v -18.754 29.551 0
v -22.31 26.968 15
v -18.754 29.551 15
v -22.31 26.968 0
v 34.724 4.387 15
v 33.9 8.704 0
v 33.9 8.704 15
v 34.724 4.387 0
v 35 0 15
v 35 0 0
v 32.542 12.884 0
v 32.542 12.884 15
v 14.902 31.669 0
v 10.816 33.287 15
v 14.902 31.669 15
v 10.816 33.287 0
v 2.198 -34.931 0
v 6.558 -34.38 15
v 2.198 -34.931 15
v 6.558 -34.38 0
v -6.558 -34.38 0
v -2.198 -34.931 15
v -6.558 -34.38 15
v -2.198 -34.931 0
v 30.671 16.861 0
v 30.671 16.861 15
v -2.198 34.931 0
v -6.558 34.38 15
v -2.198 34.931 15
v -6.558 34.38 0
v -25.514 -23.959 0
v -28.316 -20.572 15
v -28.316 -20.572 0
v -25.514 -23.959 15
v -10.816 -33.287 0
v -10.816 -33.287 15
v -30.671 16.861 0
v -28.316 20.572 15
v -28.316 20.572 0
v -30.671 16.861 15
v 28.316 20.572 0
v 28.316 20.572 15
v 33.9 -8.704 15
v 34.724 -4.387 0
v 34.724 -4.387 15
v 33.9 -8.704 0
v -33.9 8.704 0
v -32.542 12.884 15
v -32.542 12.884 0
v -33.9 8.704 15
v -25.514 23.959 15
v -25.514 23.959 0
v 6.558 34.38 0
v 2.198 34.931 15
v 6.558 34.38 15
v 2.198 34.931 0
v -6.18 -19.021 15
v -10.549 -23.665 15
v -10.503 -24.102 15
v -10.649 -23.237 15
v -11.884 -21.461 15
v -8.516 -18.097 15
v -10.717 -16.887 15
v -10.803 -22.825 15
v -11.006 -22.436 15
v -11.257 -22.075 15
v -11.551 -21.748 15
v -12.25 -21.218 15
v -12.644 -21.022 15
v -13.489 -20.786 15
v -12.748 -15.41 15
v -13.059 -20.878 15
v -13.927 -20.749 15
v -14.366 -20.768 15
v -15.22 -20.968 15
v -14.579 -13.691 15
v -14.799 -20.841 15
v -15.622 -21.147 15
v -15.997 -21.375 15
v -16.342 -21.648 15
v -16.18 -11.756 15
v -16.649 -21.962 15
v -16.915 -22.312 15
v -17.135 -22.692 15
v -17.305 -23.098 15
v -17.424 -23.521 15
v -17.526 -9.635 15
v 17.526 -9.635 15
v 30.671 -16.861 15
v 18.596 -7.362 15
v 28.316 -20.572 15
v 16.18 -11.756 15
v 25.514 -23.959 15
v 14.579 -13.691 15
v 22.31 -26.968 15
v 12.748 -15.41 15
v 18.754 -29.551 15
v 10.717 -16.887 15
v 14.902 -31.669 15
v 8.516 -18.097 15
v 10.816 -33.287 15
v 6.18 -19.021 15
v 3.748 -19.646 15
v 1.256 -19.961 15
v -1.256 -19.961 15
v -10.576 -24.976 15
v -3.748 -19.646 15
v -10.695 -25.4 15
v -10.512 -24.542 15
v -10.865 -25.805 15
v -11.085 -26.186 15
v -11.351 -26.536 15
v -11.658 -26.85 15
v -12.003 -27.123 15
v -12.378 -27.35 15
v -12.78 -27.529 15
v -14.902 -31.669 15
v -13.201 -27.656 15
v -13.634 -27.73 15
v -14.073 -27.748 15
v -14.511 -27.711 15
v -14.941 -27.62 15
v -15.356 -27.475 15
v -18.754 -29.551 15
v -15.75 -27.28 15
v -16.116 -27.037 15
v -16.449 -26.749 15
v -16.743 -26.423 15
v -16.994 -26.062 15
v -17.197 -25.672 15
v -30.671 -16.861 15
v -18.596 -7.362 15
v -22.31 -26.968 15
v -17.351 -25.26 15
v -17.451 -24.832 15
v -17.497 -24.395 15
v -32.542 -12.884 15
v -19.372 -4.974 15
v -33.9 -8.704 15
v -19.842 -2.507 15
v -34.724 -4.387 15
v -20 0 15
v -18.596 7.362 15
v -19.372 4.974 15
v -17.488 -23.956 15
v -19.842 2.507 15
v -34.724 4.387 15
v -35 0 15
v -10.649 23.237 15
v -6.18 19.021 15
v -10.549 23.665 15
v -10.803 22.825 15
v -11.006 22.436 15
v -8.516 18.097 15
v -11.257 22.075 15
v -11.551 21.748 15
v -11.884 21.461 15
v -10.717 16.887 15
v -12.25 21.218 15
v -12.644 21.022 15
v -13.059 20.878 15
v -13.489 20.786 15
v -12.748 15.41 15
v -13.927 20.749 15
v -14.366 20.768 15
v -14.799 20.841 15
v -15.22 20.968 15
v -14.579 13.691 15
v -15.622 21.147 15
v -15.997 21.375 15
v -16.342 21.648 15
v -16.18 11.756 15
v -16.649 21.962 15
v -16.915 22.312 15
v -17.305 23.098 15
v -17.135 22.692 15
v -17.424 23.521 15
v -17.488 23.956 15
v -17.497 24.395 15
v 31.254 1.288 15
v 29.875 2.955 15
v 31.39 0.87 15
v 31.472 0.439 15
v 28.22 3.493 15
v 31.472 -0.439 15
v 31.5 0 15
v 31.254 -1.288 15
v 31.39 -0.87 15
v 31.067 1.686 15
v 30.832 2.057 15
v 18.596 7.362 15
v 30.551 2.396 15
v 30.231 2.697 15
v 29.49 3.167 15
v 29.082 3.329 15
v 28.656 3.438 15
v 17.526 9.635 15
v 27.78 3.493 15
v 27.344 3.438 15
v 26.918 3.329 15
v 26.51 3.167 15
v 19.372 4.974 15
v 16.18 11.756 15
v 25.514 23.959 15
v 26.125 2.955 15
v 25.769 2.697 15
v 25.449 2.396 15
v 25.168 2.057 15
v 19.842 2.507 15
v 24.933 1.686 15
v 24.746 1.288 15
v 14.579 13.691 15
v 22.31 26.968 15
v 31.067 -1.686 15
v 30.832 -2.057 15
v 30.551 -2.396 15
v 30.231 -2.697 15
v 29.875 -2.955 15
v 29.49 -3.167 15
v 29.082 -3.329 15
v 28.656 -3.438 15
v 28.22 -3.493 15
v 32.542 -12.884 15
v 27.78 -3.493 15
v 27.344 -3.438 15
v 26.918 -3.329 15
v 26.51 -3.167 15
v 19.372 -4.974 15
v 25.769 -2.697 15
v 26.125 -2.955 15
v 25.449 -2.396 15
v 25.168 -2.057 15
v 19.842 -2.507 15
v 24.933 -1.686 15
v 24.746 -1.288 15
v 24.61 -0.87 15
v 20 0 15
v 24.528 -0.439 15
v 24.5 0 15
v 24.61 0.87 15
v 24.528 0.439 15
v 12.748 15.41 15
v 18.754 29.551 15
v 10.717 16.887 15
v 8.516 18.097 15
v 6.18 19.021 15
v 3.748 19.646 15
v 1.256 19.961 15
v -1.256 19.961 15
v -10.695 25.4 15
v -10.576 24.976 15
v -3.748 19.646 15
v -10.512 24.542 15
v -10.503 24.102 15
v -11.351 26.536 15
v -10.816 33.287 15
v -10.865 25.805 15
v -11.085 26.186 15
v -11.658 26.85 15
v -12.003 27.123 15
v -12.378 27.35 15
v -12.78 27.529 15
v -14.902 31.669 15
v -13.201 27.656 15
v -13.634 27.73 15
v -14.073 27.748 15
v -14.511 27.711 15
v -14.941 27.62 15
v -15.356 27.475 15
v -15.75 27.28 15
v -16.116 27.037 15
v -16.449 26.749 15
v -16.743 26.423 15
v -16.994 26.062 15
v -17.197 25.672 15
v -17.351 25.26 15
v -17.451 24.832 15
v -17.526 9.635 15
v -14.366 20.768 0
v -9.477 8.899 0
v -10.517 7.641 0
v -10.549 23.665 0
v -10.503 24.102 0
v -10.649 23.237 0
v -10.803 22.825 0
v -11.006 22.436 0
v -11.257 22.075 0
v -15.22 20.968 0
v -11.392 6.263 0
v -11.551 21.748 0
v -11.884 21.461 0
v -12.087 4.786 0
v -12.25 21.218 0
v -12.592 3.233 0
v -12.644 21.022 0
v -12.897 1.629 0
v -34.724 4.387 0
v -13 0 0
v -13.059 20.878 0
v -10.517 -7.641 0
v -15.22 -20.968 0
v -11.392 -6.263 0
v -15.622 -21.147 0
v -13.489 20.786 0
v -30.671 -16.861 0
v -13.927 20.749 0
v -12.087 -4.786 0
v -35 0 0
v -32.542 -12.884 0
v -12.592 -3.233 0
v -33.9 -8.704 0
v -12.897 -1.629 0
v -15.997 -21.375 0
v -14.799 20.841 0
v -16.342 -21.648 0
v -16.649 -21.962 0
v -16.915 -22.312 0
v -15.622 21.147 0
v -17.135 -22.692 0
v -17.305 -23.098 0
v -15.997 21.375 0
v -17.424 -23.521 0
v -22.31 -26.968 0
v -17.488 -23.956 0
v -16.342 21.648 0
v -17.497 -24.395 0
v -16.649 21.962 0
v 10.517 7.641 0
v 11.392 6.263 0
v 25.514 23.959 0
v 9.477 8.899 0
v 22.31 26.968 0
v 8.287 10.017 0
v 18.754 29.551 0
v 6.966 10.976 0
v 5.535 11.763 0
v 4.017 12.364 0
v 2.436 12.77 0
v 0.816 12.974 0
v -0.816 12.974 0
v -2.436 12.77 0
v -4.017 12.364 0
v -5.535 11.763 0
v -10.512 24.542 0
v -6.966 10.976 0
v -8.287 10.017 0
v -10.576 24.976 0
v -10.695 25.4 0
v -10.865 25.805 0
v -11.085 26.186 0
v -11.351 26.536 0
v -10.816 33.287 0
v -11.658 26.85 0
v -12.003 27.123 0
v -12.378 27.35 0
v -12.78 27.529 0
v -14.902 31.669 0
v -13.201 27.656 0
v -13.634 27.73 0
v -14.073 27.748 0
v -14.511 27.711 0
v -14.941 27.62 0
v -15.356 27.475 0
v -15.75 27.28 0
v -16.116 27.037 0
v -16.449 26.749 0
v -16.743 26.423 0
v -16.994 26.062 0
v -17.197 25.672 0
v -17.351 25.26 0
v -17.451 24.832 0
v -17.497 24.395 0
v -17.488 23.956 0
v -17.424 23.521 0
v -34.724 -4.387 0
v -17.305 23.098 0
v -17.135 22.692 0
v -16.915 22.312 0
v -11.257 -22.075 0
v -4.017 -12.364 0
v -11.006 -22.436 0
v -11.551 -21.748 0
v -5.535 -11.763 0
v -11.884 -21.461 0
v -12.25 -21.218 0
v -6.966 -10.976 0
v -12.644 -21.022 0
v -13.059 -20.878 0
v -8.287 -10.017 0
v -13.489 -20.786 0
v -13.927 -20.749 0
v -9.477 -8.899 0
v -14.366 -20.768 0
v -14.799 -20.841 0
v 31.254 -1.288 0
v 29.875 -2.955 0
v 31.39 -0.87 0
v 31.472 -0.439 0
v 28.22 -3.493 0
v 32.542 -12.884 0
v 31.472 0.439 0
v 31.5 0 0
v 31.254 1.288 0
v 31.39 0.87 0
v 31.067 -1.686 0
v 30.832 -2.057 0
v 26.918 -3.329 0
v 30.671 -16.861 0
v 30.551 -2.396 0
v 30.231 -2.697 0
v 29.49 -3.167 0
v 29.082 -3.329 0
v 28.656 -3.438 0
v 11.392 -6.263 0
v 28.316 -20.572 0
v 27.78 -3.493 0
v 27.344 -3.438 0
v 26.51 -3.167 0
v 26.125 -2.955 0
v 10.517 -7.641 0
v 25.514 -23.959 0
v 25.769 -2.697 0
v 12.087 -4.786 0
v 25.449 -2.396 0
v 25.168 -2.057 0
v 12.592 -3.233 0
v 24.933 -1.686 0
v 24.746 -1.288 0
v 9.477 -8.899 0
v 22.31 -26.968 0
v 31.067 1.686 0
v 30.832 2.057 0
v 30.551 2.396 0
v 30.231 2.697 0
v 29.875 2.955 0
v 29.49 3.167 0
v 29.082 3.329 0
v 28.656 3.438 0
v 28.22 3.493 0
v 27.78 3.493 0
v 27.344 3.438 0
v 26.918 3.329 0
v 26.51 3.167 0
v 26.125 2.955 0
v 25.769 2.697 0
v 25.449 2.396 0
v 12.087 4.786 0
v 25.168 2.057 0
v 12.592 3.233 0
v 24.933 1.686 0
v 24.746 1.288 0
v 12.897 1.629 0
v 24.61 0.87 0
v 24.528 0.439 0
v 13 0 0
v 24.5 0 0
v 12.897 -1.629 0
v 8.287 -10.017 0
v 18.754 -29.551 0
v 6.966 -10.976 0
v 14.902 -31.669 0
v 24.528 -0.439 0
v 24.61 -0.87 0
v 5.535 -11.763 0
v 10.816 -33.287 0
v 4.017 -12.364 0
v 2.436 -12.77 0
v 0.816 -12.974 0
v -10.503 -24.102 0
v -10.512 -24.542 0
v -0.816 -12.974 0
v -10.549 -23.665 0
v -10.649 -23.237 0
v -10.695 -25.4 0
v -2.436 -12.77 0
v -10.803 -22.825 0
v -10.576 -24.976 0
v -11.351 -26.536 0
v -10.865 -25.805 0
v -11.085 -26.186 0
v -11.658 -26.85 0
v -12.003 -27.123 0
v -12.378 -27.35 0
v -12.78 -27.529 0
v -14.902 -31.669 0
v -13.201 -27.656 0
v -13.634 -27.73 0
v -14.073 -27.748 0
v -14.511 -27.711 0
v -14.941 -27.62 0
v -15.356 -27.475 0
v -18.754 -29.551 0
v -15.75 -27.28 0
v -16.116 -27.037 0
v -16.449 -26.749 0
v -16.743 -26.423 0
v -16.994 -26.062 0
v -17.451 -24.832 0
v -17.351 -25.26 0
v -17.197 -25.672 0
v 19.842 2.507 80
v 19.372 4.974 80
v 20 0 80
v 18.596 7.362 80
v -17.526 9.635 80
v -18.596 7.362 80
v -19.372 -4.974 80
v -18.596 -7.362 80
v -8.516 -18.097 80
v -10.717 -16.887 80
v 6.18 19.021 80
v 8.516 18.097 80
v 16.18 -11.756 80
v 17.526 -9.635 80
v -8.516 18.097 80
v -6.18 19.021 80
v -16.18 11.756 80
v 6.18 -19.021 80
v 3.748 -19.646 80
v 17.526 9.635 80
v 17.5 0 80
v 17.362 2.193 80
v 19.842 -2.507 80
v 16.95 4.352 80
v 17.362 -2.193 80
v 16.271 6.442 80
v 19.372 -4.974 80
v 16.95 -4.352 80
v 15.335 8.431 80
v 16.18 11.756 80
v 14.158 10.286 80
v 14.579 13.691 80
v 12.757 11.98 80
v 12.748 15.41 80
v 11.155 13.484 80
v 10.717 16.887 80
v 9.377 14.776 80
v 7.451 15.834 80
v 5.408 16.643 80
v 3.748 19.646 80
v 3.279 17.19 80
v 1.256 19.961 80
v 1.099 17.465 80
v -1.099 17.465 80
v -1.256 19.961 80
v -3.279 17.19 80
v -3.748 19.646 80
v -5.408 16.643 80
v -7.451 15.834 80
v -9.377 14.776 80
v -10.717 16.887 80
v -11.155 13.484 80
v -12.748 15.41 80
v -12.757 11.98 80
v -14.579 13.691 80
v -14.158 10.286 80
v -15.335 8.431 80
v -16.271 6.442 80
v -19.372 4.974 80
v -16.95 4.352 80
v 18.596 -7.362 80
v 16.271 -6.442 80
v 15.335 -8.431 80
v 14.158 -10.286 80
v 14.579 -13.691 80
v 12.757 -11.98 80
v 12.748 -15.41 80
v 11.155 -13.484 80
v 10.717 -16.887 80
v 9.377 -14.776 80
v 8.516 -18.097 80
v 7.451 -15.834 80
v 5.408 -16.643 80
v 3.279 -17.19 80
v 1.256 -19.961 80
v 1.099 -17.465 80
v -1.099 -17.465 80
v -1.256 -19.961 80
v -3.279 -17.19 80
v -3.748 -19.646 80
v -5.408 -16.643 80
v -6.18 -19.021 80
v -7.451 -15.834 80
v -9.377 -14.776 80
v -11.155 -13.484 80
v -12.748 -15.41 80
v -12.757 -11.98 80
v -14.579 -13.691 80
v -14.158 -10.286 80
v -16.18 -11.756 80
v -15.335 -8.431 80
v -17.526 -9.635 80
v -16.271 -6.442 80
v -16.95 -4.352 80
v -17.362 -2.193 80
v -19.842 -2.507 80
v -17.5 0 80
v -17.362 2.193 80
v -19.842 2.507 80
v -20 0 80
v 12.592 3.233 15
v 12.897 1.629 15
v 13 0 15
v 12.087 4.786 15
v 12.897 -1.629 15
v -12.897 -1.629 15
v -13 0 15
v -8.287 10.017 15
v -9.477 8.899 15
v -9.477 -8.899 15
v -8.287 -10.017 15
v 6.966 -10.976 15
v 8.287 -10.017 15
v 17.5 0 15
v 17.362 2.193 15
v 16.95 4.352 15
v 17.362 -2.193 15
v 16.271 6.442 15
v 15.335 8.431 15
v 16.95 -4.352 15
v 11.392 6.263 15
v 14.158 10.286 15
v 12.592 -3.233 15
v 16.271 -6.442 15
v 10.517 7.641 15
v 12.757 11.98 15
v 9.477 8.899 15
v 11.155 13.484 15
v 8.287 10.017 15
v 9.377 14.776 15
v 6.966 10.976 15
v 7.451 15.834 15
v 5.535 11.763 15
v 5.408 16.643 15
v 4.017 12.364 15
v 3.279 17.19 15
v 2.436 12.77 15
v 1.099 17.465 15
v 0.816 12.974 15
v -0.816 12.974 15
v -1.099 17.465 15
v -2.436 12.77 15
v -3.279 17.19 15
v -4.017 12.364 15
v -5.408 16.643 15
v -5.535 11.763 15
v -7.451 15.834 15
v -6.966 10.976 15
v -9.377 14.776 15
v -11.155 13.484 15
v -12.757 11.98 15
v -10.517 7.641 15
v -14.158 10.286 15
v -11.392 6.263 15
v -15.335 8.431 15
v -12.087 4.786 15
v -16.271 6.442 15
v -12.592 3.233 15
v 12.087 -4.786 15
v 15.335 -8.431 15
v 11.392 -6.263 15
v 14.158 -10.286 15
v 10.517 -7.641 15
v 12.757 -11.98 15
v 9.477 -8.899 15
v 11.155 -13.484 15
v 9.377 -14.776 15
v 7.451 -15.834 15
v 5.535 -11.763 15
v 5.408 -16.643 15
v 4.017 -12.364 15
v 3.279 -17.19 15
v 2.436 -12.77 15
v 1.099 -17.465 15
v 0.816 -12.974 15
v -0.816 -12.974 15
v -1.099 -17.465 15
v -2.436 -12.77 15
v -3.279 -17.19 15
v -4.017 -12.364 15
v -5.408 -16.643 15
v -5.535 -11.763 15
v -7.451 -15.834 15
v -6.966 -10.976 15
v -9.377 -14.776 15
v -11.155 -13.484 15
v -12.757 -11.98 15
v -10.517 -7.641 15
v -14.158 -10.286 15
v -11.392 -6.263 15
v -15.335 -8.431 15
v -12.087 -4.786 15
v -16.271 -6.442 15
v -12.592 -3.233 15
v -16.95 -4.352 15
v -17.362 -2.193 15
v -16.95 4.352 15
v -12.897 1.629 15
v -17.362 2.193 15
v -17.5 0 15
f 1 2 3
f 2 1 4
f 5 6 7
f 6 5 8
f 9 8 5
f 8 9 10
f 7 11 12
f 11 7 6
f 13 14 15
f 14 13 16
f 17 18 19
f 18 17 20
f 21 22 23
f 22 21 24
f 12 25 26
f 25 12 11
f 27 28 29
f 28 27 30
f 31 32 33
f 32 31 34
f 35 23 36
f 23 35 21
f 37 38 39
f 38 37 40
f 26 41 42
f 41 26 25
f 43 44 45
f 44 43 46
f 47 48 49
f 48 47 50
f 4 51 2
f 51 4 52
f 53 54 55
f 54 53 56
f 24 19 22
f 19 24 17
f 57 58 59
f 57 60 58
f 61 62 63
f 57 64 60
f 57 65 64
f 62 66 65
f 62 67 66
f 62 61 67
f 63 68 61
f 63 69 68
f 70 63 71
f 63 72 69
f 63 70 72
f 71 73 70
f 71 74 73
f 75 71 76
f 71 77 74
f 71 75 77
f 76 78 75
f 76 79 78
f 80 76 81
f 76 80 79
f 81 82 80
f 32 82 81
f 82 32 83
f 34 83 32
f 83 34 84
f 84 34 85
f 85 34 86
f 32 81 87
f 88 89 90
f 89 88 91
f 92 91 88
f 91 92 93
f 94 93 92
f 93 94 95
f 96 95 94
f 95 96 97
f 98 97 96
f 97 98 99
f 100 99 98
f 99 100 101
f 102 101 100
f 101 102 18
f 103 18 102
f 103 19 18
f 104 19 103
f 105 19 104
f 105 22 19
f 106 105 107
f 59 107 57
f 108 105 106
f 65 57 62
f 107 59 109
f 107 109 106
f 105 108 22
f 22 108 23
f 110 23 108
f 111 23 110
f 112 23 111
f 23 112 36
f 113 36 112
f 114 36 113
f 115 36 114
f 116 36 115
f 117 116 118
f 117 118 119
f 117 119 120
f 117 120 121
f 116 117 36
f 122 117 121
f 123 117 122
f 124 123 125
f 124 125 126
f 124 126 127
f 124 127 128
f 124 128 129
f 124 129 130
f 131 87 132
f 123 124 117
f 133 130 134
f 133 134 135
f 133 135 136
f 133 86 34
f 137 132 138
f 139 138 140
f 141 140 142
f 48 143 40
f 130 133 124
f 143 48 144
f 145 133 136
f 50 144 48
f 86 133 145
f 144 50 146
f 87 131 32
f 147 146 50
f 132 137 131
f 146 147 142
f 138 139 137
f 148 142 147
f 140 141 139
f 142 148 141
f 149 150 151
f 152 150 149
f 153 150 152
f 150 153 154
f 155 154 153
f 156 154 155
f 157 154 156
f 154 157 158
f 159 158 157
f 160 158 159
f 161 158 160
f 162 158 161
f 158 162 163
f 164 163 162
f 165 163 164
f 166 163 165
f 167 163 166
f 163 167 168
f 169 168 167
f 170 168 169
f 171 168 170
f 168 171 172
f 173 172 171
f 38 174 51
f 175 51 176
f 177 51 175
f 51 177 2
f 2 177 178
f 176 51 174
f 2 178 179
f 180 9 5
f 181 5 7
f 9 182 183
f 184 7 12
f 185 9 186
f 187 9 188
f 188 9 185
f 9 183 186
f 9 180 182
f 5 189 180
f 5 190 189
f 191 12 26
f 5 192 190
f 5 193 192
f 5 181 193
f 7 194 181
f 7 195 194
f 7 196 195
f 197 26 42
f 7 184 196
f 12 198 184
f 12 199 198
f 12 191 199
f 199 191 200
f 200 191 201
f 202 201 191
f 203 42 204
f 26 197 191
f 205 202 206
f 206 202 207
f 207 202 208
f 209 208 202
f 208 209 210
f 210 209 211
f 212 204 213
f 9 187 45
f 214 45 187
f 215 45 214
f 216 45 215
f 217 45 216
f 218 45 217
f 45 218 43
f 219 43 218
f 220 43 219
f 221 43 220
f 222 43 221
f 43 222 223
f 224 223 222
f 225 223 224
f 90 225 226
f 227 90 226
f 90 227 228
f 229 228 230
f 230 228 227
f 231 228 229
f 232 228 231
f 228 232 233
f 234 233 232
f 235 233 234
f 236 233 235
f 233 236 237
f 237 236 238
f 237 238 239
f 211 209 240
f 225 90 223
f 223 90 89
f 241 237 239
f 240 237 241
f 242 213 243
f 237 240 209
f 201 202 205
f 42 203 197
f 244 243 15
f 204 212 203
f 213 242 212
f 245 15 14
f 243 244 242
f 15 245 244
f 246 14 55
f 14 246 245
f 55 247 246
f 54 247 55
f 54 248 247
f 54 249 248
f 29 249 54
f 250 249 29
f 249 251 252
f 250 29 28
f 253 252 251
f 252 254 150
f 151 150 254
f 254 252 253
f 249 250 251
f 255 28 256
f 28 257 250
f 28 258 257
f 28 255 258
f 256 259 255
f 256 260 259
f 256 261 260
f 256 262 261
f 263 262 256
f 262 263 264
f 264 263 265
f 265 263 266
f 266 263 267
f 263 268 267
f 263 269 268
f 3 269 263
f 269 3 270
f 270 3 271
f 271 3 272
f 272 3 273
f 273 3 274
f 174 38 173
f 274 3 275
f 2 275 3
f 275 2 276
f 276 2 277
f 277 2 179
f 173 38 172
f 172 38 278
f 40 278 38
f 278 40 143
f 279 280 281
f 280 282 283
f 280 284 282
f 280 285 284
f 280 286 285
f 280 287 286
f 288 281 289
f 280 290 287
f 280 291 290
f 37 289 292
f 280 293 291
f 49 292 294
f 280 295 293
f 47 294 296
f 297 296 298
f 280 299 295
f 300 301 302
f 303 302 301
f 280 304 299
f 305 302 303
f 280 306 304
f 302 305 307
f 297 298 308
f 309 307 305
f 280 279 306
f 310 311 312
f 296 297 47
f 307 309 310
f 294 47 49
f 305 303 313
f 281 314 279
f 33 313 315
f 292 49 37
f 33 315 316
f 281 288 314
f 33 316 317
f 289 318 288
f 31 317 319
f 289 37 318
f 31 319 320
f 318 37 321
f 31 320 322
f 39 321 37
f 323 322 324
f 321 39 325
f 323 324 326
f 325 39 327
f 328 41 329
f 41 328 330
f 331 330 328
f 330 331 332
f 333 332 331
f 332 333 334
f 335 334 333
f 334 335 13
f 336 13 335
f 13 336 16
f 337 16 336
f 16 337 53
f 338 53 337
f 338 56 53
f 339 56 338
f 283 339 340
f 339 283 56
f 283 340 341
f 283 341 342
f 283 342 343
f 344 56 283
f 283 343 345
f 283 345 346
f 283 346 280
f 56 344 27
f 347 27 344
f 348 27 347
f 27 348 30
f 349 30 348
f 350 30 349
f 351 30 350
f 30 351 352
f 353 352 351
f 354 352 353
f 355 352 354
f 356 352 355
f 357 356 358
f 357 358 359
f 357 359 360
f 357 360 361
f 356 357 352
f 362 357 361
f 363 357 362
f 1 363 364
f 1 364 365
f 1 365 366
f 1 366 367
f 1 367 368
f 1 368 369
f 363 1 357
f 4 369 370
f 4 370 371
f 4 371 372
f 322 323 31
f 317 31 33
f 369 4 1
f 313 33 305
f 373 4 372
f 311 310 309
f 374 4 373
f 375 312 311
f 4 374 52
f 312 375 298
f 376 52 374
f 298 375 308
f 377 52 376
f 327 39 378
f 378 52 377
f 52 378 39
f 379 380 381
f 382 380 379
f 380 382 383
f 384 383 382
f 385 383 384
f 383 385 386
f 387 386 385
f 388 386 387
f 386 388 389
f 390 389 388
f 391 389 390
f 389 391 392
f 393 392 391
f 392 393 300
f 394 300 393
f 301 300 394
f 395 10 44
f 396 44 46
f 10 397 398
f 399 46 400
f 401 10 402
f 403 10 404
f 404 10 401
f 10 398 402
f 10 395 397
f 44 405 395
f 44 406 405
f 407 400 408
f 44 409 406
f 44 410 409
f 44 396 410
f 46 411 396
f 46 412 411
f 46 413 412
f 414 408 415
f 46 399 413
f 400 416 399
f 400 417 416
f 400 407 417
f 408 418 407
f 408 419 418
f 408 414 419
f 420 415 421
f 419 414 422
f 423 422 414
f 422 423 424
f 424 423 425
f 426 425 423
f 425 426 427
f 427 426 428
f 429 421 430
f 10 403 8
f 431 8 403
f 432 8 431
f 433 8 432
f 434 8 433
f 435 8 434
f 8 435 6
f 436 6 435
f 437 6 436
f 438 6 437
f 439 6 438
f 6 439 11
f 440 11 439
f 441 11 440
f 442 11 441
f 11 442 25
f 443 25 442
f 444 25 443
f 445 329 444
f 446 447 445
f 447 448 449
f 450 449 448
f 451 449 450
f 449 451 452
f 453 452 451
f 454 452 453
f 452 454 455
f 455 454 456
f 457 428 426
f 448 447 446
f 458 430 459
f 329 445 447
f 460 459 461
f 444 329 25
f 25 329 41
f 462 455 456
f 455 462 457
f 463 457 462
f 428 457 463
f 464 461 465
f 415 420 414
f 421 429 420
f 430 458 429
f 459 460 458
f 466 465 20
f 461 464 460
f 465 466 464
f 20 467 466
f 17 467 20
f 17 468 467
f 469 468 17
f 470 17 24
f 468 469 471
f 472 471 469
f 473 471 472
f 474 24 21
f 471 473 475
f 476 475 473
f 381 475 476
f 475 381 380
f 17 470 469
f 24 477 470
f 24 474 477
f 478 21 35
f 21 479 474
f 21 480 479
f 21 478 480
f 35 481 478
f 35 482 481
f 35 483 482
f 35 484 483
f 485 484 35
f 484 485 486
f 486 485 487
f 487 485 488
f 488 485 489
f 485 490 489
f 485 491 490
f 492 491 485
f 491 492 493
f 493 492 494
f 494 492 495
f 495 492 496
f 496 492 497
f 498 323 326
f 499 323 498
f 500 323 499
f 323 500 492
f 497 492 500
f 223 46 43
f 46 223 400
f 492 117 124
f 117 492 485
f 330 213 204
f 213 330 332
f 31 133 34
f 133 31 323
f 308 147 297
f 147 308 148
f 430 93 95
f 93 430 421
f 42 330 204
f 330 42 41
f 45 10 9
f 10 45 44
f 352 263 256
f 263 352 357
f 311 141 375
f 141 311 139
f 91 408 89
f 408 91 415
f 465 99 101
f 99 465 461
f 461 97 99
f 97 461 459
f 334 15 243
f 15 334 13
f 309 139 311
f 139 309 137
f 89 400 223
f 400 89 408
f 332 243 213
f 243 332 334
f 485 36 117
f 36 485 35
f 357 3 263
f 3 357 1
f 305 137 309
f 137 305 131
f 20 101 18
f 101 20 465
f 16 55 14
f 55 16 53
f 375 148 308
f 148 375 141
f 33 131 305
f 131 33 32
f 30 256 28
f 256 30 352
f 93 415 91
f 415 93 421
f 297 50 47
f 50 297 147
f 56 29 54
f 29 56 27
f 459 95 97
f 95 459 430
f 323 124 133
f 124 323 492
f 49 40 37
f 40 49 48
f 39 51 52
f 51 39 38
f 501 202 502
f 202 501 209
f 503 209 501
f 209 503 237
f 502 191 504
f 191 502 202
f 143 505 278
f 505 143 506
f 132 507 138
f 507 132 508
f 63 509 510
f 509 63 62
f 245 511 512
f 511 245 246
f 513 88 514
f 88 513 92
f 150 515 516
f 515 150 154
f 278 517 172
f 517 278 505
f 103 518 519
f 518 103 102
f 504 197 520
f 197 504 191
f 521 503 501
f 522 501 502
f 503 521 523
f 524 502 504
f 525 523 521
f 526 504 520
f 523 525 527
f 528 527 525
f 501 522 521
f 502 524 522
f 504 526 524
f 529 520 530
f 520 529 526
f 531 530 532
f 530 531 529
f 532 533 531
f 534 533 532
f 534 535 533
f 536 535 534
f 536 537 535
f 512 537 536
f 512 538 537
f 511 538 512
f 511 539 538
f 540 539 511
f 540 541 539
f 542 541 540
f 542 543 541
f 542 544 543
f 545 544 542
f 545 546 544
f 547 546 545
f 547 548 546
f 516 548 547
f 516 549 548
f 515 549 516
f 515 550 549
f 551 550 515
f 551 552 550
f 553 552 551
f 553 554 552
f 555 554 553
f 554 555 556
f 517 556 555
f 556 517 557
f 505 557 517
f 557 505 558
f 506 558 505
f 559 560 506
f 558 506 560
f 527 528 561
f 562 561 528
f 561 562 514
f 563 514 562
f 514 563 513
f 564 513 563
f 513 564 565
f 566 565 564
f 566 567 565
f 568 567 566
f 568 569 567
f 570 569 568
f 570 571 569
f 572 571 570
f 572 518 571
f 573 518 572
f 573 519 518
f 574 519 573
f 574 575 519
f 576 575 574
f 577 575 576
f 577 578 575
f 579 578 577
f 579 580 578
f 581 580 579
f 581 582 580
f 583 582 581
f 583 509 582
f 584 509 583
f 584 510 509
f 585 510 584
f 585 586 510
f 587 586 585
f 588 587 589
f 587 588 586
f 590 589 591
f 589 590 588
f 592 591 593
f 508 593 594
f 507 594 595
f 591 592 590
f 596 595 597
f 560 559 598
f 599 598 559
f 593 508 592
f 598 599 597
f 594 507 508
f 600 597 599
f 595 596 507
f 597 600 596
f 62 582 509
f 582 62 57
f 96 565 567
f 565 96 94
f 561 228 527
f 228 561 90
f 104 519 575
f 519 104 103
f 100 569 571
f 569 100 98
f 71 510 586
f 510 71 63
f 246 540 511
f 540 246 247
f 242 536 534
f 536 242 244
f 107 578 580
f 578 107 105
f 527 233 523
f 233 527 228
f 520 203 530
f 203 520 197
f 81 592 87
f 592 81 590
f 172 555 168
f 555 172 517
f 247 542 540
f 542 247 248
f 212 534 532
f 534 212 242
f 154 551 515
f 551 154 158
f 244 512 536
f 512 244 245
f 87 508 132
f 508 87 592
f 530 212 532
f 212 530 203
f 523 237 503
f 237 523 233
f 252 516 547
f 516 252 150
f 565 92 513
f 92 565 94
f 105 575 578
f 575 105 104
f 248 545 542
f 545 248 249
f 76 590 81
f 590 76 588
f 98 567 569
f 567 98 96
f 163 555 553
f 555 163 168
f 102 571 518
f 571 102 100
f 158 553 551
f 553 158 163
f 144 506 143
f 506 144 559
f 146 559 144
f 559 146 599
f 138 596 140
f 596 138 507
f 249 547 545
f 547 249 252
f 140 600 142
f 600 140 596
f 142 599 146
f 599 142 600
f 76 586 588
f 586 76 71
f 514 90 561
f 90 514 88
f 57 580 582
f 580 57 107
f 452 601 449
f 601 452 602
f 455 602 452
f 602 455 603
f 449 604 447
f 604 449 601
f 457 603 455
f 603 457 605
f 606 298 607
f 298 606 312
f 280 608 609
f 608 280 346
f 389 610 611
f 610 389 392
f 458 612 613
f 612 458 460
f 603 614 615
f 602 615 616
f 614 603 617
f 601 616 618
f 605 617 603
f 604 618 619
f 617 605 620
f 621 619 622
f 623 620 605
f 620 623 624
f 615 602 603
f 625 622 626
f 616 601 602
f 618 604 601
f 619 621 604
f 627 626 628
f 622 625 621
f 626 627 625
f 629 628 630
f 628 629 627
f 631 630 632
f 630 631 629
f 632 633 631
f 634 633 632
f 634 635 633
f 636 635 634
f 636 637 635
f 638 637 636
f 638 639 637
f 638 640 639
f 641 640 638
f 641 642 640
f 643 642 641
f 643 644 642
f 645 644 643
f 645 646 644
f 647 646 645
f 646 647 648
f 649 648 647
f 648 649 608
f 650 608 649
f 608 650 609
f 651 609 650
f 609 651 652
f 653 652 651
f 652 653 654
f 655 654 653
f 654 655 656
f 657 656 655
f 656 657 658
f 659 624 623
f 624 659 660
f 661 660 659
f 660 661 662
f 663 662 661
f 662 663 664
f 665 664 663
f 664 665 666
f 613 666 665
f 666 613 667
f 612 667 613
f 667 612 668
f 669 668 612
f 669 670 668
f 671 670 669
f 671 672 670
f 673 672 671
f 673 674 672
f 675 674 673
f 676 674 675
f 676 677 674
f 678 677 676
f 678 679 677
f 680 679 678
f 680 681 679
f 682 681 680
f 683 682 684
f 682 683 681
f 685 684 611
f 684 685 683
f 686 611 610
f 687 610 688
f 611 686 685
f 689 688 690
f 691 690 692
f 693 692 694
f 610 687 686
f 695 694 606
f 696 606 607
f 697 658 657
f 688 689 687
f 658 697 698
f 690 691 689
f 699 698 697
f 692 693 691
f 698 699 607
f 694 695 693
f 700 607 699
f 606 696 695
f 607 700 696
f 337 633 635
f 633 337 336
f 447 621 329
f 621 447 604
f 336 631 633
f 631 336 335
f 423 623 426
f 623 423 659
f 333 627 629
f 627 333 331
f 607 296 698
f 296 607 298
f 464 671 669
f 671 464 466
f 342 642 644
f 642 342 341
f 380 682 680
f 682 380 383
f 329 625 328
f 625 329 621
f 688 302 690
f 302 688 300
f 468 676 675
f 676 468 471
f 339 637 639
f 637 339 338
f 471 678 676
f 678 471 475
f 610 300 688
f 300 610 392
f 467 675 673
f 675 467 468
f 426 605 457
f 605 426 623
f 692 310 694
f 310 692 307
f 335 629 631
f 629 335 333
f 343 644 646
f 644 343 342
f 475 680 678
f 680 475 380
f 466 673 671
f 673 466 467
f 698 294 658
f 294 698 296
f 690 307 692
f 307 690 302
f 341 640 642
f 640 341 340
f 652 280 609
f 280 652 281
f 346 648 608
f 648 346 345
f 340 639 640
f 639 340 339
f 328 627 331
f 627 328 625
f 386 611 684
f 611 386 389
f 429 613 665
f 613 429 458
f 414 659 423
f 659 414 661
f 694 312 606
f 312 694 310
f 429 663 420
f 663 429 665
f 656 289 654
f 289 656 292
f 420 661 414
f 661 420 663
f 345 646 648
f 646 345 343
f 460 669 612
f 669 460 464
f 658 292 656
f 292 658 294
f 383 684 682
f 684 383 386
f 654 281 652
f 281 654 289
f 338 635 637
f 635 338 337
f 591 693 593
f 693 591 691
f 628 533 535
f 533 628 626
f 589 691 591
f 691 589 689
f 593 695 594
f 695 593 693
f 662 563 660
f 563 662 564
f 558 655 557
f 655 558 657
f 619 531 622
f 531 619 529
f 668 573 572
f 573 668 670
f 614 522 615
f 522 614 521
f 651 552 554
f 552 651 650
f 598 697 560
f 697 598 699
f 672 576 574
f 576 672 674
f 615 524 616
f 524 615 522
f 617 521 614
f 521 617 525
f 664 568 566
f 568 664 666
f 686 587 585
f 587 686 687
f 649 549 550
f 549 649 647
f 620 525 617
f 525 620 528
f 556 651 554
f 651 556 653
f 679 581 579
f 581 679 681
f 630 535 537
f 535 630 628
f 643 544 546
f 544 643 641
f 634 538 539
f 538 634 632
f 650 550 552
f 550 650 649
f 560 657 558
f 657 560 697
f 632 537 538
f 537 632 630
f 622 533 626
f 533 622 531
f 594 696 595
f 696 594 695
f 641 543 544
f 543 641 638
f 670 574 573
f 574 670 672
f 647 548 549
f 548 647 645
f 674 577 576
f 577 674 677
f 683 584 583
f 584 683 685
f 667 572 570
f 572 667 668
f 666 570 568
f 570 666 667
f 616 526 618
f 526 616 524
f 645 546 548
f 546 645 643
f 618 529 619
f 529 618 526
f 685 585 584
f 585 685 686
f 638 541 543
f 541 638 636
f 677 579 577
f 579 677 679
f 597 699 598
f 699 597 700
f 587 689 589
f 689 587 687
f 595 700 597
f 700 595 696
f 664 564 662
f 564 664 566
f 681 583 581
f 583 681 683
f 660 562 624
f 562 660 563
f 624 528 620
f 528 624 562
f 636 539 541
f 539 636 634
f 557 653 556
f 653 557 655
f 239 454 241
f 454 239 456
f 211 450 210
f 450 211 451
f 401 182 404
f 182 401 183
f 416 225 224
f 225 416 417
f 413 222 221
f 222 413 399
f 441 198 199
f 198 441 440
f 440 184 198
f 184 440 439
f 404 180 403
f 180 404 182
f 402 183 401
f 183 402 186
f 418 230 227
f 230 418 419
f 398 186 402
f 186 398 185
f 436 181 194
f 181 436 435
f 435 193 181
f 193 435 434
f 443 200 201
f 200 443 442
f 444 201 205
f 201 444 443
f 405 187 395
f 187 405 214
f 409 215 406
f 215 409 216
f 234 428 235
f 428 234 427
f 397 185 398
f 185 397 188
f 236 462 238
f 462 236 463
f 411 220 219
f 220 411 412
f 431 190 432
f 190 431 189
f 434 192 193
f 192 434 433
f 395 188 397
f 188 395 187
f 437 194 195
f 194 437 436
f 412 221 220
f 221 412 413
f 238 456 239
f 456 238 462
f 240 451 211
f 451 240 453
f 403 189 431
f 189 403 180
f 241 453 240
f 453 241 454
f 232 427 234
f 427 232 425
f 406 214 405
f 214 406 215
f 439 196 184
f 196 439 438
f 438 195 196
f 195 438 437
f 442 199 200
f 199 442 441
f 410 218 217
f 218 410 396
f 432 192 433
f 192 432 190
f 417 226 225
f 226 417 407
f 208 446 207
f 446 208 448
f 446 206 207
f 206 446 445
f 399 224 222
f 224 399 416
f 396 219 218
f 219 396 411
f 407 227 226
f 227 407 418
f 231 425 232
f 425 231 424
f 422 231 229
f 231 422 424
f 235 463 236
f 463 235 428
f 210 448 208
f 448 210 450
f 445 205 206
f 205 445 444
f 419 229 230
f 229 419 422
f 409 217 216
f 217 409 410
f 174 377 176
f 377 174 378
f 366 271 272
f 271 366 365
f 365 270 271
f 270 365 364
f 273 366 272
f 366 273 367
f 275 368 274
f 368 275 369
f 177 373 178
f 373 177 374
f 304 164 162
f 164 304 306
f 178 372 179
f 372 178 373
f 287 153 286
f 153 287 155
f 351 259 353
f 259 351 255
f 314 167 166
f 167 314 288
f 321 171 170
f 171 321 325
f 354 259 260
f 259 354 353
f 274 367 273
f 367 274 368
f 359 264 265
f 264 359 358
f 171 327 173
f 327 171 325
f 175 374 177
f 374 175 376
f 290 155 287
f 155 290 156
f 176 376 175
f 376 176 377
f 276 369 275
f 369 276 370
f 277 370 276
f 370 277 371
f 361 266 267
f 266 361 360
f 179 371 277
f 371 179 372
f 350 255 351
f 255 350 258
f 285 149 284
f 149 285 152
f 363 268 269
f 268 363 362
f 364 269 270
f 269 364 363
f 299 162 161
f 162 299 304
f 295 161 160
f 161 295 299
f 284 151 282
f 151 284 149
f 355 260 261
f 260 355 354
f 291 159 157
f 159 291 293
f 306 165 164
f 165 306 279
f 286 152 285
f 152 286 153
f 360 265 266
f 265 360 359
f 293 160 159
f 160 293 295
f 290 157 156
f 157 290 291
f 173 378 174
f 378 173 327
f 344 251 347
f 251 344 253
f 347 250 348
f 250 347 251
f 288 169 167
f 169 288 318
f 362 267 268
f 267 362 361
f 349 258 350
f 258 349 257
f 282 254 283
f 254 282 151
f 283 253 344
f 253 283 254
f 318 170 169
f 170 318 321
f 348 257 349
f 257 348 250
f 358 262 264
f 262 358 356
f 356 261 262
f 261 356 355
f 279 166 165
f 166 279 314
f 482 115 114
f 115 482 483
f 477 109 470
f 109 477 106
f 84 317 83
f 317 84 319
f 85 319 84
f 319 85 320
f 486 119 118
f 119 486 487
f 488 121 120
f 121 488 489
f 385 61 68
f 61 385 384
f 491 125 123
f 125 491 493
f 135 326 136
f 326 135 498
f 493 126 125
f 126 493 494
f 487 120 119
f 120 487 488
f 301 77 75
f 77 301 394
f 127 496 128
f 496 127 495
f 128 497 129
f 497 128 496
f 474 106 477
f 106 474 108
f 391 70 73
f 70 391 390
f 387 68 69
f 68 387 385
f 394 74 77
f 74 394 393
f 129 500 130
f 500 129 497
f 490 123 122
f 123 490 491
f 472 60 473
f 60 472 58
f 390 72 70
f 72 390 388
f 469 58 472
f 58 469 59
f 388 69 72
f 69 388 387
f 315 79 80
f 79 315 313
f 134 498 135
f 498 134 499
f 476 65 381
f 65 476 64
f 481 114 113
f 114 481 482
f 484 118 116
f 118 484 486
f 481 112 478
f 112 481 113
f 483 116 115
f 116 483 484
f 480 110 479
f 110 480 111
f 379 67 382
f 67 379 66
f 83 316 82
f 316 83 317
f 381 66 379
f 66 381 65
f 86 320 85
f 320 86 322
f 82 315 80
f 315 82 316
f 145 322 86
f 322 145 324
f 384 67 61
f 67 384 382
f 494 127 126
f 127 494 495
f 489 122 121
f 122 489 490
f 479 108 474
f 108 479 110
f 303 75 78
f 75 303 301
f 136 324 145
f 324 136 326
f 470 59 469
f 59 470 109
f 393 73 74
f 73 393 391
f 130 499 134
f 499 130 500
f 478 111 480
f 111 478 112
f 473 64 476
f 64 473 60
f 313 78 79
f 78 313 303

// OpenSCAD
/* [Flange Dimensions] */
flange_height = 15;
flange_diameter = 70;
guy_hole_diameter = 7;

/* [Pole Dimensions] */
fishing_pole_diameter = 26;
pvc_diameter = 35;
height = 80;


/* [hidden] */
$fn=50;
guy_hole_radius = flange_diameter / 2 - 7;

difference() {
difference() {
difference() {
difference() {
    difference() {
    difference() {    
        union() {
            cylinder(h=flange_height, d=flange_diameter);
            cylinder(h=height, d=pvc_diameter + 5);
        };
        cylinder(h=flange_height, d=fishing_pole_diameter);
    };
        translate([0,0,flange_height])
        cylinder(h=height-flange_height, d=pvc_diameter);
        };
    };
    translate([guy_hole_radius,0,0])
    cylinder(h=flange_height, d=guy_hole_diameter);
   };
   rotate([0,0,120])
   translate([guy_hole_radius,0,0])
   cylinder(h=flange_height, d=guy_hole_diameter);
   };
   rotate([0,0,-120])
   translate([guy_hole_radius,0,0])
   cylinder(h=flange_height, d=guy_hole_diameter);
};
